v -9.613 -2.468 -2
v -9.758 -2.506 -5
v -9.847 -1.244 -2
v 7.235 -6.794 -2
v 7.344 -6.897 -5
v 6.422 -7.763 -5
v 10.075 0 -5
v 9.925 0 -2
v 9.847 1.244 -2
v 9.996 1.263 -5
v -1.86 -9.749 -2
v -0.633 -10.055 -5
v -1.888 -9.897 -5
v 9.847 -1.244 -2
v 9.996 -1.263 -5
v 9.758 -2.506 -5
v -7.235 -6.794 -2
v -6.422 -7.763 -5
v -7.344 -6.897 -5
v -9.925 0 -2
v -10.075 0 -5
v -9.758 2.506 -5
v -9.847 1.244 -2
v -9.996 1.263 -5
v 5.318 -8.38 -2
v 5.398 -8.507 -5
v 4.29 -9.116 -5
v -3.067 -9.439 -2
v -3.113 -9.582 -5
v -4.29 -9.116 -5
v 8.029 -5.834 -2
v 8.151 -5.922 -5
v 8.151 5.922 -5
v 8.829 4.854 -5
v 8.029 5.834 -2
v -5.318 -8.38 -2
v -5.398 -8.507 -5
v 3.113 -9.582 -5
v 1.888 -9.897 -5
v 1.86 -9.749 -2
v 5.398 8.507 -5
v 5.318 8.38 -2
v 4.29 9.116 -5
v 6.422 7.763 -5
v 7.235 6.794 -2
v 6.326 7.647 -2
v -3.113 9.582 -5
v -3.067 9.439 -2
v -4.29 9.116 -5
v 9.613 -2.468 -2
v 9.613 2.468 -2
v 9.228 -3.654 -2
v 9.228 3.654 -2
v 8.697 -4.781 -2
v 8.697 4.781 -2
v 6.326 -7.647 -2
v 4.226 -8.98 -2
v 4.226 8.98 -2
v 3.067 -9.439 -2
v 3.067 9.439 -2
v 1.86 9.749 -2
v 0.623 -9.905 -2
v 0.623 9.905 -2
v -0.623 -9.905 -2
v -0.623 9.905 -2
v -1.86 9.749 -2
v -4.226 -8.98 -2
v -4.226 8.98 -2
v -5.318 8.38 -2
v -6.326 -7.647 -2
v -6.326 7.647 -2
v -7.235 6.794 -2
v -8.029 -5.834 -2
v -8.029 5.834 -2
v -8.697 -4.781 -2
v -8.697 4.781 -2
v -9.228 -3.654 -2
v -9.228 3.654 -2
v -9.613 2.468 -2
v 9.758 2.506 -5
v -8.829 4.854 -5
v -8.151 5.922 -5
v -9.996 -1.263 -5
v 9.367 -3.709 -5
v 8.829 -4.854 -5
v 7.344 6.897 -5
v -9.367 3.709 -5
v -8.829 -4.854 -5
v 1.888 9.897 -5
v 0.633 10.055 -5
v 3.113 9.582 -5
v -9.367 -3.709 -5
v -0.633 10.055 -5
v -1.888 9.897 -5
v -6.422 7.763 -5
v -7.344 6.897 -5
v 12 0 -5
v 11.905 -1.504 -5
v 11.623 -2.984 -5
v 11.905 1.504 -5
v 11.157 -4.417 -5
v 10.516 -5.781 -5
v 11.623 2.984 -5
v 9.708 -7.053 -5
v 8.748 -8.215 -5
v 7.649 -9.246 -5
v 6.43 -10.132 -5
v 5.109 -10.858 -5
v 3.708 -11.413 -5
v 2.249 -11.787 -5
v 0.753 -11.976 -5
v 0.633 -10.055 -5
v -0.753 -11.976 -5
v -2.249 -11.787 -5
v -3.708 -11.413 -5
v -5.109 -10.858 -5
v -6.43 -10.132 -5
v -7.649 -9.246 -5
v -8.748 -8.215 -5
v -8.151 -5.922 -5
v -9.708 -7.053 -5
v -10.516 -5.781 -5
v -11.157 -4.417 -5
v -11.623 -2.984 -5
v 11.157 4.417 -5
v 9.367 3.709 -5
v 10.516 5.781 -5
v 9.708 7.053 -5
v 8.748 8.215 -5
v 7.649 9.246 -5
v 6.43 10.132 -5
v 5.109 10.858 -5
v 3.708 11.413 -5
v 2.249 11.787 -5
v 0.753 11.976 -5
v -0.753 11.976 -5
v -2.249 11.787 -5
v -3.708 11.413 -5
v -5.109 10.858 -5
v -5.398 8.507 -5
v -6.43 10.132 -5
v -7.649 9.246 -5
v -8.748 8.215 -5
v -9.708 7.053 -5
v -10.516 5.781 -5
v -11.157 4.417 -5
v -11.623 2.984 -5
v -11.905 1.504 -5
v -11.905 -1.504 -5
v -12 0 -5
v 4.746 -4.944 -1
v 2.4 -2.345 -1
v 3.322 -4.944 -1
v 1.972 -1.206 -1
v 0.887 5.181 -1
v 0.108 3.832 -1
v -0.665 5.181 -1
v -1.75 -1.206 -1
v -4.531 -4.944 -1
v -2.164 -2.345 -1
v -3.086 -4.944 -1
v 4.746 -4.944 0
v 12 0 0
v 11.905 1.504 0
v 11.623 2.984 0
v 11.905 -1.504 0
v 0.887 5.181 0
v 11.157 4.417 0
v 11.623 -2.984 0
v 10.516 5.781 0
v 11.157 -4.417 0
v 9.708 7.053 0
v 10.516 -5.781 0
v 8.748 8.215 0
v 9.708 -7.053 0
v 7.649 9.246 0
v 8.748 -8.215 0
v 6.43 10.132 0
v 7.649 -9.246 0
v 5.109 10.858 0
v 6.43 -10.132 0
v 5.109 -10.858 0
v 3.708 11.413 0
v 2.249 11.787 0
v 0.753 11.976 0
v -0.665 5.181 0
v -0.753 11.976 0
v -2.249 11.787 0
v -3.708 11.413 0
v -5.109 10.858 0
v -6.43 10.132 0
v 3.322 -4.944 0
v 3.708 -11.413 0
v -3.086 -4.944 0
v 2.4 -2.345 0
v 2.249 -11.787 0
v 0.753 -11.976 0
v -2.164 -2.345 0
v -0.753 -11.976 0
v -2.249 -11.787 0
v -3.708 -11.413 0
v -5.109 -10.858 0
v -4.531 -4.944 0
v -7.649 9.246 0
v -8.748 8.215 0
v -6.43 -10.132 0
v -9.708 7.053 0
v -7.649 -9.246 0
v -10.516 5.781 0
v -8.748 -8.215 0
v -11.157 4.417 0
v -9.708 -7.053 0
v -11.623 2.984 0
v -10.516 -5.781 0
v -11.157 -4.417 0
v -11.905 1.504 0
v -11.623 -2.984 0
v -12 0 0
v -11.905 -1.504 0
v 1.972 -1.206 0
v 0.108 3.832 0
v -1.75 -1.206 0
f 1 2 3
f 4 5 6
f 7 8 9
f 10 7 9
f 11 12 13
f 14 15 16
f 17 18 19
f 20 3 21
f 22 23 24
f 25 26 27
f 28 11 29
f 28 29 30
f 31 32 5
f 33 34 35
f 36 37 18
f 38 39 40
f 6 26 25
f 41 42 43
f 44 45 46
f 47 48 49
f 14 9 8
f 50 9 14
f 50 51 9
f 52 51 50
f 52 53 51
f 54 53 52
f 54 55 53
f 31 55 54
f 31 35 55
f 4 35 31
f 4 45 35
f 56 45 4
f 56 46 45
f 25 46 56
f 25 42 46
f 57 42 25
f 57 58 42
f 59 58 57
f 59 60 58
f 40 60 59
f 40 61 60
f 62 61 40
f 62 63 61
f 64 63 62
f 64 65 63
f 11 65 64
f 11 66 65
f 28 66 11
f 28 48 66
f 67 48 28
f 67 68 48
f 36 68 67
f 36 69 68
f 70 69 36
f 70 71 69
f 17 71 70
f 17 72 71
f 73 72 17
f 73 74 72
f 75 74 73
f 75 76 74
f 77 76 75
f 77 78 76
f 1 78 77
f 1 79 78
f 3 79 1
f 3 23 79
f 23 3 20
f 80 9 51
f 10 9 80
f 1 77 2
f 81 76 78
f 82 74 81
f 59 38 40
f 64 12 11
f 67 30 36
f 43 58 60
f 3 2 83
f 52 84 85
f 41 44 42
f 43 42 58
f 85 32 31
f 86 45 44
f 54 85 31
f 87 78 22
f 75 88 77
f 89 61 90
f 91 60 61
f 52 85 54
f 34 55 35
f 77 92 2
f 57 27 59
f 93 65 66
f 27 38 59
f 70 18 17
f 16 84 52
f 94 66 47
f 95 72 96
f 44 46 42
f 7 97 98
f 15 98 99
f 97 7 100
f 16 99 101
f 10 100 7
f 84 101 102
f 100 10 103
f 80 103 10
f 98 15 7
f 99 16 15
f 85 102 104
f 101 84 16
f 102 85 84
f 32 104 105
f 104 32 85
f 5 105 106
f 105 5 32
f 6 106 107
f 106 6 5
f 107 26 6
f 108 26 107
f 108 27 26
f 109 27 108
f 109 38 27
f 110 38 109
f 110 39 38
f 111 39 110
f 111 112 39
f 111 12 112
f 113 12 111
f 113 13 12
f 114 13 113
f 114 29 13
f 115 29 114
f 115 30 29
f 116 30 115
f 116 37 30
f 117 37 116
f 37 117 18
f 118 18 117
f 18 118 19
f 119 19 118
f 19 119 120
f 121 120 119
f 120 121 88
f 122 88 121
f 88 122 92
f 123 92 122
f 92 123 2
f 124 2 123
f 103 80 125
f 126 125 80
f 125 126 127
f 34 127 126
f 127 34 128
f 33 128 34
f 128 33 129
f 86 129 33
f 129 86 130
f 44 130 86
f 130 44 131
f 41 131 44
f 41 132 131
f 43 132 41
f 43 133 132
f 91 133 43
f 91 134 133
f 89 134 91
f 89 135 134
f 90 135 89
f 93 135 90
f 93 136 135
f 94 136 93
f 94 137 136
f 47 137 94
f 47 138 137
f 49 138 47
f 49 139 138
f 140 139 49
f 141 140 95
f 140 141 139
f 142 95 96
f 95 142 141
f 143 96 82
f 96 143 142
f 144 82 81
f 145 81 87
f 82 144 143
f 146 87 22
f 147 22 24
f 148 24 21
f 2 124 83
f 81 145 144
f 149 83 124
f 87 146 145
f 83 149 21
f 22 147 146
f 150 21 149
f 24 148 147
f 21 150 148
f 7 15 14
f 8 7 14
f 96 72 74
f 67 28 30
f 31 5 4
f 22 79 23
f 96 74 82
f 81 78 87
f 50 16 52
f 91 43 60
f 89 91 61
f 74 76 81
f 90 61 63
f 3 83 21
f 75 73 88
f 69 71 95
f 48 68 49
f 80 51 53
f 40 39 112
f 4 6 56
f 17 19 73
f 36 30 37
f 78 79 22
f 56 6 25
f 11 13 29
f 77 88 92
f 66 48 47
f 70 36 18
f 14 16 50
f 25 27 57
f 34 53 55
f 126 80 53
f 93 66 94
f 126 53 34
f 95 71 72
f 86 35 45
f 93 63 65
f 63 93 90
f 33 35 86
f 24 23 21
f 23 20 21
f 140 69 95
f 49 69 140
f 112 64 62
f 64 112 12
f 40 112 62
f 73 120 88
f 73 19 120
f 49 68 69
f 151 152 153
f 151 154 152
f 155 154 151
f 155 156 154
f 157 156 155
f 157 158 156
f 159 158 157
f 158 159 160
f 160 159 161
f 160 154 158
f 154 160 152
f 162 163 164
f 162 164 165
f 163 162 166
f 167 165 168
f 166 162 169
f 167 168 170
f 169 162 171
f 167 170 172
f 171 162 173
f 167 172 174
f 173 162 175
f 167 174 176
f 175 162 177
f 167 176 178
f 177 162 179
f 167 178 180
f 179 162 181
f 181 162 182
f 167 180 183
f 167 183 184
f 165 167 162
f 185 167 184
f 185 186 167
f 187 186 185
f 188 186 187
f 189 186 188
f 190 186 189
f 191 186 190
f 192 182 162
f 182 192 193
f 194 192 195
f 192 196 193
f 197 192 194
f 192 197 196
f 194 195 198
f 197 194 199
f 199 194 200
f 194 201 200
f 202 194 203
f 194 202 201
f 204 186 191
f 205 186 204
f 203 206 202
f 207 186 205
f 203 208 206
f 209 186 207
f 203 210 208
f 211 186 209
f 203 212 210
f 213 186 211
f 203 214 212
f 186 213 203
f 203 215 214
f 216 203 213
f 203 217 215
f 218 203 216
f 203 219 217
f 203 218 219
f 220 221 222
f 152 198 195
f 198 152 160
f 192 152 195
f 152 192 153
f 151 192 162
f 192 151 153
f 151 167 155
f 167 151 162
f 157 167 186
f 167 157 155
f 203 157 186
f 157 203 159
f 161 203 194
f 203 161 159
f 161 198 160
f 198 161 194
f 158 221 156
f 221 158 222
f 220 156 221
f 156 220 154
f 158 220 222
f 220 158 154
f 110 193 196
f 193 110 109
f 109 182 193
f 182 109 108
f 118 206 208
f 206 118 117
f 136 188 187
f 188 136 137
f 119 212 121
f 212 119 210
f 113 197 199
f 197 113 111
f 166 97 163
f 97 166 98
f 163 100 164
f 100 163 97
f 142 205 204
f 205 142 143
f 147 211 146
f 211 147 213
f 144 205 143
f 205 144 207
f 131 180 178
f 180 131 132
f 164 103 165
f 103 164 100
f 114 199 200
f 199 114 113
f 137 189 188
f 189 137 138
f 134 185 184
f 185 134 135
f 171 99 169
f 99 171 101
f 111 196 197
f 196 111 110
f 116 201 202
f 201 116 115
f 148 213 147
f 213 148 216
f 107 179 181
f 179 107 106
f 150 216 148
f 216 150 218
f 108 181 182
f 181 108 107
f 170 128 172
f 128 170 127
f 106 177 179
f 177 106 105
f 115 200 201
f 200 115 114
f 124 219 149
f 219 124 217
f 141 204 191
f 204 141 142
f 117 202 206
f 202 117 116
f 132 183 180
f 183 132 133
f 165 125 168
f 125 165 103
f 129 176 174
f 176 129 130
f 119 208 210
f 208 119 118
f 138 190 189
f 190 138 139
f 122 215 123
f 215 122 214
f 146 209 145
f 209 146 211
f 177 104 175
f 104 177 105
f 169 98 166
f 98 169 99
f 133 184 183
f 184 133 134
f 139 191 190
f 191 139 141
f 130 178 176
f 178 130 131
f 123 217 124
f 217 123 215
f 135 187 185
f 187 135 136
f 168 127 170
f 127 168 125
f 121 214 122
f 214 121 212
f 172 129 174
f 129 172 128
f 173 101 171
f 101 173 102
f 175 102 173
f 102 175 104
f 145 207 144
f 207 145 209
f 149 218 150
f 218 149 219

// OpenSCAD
$fn = 50;


difference() {
	union() {
		translate(v = [0, 0, -5.0000000000]) {
			cylinder(h = 5, r = 12.0000000000);
		}
	}
	union() {
		#translate(v = [0, 0, -5.0000000000]) {
			cylinder(h = 3, r1 = 10.0750000000, r2 = 9.9250000000);
		}
		translate(v = [0, 0, -1]) {
			linear_extrude(height = 1) {
				text(font = "Impact", halign = "center", size = 10, text = "A", valign = "center");
			}
		}
	}
}
